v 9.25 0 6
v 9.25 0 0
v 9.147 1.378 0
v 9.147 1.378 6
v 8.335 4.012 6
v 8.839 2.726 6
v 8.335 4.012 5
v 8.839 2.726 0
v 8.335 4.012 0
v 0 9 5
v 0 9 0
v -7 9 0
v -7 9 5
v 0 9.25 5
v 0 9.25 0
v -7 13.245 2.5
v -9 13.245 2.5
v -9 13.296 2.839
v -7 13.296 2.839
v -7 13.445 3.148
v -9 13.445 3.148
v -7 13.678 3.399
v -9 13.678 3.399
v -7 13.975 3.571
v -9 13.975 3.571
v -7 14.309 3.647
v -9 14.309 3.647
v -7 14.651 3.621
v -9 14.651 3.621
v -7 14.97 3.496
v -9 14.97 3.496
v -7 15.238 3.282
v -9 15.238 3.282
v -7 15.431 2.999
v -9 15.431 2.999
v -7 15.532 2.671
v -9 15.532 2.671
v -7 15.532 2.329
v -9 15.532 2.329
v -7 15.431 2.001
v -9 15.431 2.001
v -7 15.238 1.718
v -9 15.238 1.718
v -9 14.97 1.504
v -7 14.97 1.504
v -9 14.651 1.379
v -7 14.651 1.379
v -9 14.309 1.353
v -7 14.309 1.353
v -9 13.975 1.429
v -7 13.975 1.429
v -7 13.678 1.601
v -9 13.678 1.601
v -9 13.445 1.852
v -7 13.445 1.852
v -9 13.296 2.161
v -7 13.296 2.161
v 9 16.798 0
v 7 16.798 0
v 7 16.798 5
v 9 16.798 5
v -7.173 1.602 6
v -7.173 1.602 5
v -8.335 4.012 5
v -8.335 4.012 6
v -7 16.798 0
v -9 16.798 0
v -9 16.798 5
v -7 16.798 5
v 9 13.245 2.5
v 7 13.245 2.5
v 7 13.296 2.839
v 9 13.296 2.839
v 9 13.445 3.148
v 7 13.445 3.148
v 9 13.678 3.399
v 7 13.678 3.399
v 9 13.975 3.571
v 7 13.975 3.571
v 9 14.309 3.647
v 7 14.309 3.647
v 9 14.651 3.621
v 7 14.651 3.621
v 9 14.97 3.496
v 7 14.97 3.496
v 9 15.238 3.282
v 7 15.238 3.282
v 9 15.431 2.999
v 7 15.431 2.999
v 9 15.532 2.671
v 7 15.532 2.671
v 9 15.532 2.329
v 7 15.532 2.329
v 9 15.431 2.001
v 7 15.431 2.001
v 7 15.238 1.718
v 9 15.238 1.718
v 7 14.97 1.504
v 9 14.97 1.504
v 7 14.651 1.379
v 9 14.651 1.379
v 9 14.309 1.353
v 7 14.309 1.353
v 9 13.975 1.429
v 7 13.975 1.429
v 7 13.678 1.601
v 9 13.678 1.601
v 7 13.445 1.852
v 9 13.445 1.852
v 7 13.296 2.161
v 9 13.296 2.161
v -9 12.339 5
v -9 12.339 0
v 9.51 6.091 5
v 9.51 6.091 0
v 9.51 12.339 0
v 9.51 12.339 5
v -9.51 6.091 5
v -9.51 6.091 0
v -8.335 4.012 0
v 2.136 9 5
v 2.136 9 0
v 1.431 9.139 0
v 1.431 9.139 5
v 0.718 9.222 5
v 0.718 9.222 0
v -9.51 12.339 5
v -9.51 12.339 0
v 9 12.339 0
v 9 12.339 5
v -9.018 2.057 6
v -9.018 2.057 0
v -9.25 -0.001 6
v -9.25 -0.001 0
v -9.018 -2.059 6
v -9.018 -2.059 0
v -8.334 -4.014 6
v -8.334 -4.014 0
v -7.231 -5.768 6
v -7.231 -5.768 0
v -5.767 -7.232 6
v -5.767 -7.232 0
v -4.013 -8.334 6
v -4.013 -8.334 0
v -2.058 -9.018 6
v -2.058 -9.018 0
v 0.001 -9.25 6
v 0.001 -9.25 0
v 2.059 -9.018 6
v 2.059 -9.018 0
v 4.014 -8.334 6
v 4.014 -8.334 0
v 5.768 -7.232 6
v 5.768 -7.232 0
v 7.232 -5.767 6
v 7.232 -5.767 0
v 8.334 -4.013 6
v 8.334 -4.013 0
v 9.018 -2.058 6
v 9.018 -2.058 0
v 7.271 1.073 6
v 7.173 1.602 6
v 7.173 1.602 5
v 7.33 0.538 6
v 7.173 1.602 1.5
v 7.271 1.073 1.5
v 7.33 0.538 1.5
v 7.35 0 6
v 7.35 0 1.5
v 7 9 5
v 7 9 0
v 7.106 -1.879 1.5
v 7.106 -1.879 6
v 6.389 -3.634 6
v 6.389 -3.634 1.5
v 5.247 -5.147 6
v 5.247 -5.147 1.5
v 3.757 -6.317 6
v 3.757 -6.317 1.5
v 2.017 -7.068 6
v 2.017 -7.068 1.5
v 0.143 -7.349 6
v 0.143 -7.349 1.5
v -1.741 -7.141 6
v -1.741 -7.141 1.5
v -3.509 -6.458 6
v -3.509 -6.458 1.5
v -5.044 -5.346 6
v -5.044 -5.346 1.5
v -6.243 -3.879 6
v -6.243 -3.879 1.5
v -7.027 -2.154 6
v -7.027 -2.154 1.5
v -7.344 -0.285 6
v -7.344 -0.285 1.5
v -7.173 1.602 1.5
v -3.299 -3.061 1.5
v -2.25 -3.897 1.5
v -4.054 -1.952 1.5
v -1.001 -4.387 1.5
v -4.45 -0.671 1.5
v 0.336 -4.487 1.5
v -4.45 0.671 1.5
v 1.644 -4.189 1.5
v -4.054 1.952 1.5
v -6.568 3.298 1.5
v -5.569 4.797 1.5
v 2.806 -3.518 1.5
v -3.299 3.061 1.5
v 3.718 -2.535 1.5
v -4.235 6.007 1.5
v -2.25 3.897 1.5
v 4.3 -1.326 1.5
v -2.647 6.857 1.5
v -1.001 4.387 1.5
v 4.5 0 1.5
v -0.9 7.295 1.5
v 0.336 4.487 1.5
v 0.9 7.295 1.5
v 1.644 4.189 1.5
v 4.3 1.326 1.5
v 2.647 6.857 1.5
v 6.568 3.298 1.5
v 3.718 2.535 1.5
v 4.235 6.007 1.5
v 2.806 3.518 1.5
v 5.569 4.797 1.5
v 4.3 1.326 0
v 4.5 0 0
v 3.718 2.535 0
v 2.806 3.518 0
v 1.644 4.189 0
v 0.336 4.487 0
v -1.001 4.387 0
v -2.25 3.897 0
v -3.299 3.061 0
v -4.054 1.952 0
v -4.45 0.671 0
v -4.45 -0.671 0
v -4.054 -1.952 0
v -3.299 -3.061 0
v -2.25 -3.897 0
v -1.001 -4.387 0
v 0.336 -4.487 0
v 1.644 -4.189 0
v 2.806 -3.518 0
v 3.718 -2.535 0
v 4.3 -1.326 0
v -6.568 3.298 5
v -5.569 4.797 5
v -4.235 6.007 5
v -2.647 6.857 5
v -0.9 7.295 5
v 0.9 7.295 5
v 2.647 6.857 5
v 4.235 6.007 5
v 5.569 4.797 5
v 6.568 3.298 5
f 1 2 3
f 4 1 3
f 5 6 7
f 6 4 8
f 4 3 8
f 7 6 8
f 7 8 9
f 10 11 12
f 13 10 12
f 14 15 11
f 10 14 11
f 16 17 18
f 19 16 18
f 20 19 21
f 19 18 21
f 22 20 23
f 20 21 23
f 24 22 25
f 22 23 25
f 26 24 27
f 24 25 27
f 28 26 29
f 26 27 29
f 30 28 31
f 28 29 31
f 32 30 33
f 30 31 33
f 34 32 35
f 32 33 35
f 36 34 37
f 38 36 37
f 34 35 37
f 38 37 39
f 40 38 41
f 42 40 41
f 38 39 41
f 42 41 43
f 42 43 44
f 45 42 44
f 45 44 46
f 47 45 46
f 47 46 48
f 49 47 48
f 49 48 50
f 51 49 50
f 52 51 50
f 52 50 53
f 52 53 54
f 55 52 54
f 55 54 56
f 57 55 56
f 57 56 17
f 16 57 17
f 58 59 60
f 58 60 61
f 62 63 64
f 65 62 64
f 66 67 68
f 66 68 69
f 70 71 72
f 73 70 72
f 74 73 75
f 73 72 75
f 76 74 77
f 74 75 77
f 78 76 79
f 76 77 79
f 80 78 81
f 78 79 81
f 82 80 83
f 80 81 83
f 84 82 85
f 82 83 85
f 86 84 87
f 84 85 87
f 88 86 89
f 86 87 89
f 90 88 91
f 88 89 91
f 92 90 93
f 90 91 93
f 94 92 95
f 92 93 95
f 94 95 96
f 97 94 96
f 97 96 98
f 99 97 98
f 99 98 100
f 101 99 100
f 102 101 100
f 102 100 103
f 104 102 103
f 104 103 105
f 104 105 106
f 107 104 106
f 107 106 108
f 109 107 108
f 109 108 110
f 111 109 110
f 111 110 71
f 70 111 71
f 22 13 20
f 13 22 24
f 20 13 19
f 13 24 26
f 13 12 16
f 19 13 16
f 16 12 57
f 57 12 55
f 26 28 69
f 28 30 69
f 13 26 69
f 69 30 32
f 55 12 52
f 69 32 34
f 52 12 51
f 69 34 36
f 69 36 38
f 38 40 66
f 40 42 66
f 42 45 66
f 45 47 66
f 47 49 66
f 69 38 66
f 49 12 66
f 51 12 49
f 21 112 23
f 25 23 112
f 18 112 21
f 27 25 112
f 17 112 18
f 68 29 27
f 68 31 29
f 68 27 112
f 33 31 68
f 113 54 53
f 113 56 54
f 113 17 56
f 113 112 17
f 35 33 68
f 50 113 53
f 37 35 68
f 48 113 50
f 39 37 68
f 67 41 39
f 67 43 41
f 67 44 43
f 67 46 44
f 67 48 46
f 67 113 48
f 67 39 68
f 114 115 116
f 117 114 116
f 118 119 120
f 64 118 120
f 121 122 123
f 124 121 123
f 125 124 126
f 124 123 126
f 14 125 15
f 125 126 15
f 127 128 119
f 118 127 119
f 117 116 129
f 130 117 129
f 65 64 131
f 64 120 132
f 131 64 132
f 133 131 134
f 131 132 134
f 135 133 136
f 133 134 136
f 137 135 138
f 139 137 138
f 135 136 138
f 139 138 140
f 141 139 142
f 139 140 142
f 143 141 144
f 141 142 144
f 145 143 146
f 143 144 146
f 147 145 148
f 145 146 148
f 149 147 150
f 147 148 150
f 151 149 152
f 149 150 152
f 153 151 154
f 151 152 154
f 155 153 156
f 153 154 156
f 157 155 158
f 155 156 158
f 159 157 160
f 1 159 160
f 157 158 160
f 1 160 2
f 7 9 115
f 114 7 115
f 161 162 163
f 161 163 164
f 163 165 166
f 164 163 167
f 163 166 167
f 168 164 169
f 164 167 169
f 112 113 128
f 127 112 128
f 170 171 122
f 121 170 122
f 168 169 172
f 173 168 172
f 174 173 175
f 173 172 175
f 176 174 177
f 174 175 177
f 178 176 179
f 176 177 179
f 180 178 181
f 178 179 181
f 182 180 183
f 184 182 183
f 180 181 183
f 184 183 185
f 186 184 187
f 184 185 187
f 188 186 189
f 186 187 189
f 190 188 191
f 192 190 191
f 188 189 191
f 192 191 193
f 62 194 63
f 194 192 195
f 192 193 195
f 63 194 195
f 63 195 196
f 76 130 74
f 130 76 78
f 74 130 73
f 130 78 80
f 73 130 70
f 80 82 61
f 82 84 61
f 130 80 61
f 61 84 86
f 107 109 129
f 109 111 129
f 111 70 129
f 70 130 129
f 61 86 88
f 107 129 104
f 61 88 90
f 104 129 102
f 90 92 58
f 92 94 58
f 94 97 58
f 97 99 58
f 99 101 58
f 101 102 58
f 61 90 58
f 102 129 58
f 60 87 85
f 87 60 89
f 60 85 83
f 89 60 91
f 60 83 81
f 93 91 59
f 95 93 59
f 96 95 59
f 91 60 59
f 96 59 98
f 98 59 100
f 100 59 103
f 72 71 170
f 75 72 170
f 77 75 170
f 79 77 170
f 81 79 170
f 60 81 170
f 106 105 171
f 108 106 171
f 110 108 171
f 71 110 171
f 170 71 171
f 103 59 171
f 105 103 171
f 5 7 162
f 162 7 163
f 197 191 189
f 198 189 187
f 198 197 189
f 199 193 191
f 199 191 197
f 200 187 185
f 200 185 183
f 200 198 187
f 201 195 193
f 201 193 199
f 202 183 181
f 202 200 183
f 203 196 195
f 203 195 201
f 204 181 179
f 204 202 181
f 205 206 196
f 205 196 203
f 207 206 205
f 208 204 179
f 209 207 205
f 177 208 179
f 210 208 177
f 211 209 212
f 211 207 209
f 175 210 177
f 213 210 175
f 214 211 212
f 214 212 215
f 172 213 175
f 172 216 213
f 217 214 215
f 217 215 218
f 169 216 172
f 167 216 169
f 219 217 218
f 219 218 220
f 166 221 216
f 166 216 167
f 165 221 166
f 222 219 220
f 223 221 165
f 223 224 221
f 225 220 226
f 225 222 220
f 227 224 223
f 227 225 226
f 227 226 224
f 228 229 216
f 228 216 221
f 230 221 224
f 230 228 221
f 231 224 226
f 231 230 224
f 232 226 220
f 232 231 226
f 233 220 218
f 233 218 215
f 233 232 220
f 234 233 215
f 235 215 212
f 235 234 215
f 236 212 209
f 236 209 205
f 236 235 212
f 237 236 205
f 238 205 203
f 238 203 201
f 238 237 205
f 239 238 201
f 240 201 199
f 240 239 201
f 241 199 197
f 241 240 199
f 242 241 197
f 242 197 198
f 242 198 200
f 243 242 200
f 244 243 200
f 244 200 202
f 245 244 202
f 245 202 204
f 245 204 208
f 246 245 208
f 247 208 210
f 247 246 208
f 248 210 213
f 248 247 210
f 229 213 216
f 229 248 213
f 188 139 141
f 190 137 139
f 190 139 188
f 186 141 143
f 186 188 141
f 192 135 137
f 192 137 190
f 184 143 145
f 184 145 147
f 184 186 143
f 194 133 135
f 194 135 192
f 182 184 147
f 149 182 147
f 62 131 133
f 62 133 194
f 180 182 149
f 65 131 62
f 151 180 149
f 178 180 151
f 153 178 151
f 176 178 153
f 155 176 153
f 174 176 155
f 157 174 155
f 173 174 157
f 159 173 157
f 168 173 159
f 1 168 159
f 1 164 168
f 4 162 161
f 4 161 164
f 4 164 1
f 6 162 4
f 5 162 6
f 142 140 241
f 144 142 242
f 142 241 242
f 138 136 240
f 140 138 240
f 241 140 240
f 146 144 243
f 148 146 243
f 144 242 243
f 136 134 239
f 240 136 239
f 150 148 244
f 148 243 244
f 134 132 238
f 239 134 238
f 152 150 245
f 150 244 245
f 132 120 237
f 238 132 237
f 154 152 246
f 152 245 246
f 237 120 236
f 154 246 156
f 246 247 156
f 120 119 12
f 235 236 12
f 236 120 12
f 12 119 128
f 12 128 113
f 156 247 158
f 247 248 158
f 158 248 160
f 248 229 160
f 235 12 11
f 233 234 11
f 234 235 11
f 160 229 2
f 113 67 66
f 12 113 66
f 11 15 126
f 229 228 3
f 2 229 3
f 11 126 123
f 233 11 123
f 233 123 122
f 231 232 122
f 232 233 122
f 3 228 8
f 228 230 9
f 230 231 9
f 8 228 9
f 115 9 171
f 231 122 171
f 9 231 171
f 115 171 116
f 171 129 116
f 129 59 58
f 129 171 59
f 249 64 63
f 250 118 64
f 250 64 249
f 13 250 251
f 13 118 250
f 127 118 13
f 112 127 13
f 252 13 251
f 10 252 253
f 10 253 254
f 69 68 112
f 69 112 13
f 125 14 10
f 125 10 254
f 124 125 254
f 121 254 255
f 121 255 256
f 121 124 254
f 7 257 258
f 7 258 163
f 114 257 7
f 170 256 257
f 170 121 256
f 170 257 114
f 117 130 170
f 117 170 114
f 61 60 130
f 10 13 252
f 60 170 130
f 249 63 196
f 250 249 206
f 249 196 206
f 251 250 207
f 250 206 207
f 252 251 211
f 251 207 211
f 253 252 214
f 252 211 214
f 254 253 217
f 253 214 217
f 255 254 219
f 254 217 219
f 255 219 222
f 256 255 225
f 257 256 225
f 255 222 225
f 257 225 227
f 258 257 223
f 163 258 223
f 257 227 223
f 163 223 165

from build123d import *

# Parameters (mm, degrees)
F0_R     = 4.5
F1_DEPTH = 1.5
F0_W     = 2
F0_H     = 4.459151
F2_DEPTH = 5
F3_DEPTH = 6
F4_R     = 1.15
F5_DEPTH = 25


with BuildPart() as f1:
    # F0 (on Top) → F1 (new body)
    with BuildSketch(Plane.XY):
        with BuildLine():
            ThreePointArc((-7.173268, 1.602102), (-0.80591, -7.305683), (7.35, 0))
            ThreePointArc((7.35, 0), (7.305683, 0.80591), (7.173268, 1.602102))
            ThreePointArc((7.173268, 1.602102), (0, 7.35), (-7.173268, 1.602102))
        make_face()
        Circle(F0_R, mode=Mode.SUBTRACT)
    extrude(amount=F1_DEPTH)

    # F0 (on Top) → F2 (join)
    with BuildSketch(Plane.XY):
        Polygon((-9.510325, 9), (-7, 9), (-7, 12.338503), (-9, 12.338503), (-9.510325, 12.338503), align=None)
        with BuildLine():
            Line((-9.510325, 6.091482), (-8.334513, 4.012281))
            ThreePointArc((-8.334513, 4.012281), (-5.798901, 7.206612), (-2.136001, 9))
            Line((-2.136001, 9), (-7, 9))
            Line((-7, 9), (-9.510325, 9))
            Line((-9.510325, 9), (-9.510325, 6.091482))
        make_face()
        with BuildLine():
            ThreePointArc((-7.173268, 1.602102), (0, 7.35), (7.173268, 1.602102))
            Line((7.173268, 1.602102), (8.334513, 4.012281))
            ThreePointArc((8.334513, 4.012281), (5.798901, 7.206612), (2.136001, 9))
            Line((2.136001, 9), (0, 9))
            Line((0, 9), (-2.136001, 9))
            ThreePointArc((-2.136001, 9), (-5.798901, 7.206612), (-8.334513, 4.012281))
            Line((-8.334513, 4.012281), (-7.173268, 1.602102))
        make_face()
        with BuildLine():
            Line((0, 9), (2.136001, 9))
            ThreePointArc((2.136001, 9), (1.075291, 9.187287), (0, 9.25))
            Line((0, 9.25), (0, 9))
        make_face()
        Polygon((7, 12.338503), (7, 9), (9.510325, 9), (9.510325, 12.338503), (9, 12.338503), align=None)
        with Locations((-8, 14.568078)):
            Rectangle(F0_W, F0_H)
        with Locations((8, 14.568078)):
            Rectangle(F0_W, F0_H)
        with BuildLine():
            ThreePointArc((2.136001, 9), (5.798901, 7.206612), (8.334513, 4.012281))
            Line((8.334513, 4.012281), (9.510325, 6.091482))
            Line((9.510325, 6.091482), (9.510325, 9))
            Line((9.510325, 9), (7, 9))
            Line((7, 9), (2.136001, 9))
        make_face()
    extrude(amount=F2_DEPTH)

    # F0 (on Top) → F3 (join)
    with BuildSketch(Plane.XY):
        with BuildLine():
            ThreePointArc((7.173268, 1.602102), (7.305683, 0.80591), (7.35, 0))
            ThreePointArc((7.35, 0), (-0.80591, -7.305683), (-7.173268, 1.602102))
            Line((-7.173268, 1.602102), (-8.334513, 4.012281))
            ThreePointArc((-8.334513, 4.012281), (-2.0577, -9.018224), (9.25, 0))
            ThreePointArc((9.25, 0), (9.018224, 2.0577), (8.334513, 4.012281))
            Line((8.334513, 4.012281), (7.173268, 1.602102))
        make_face()
    extrude(amount=F3_DEPTH)

    # F4 (on face) → F5 (cut)
    with BuildSketch(Plane(origin=(-9, 0, 0), x_dir=(0, -1, 0), z_dir=(-1, 0, 0))):
        with Locations((-14.394956, 2.5)):
            Circle(F4_R)
    extrude(amount=-F5_DEPTH, mode=Mode.SUBTRACT)


solid = f1.part
